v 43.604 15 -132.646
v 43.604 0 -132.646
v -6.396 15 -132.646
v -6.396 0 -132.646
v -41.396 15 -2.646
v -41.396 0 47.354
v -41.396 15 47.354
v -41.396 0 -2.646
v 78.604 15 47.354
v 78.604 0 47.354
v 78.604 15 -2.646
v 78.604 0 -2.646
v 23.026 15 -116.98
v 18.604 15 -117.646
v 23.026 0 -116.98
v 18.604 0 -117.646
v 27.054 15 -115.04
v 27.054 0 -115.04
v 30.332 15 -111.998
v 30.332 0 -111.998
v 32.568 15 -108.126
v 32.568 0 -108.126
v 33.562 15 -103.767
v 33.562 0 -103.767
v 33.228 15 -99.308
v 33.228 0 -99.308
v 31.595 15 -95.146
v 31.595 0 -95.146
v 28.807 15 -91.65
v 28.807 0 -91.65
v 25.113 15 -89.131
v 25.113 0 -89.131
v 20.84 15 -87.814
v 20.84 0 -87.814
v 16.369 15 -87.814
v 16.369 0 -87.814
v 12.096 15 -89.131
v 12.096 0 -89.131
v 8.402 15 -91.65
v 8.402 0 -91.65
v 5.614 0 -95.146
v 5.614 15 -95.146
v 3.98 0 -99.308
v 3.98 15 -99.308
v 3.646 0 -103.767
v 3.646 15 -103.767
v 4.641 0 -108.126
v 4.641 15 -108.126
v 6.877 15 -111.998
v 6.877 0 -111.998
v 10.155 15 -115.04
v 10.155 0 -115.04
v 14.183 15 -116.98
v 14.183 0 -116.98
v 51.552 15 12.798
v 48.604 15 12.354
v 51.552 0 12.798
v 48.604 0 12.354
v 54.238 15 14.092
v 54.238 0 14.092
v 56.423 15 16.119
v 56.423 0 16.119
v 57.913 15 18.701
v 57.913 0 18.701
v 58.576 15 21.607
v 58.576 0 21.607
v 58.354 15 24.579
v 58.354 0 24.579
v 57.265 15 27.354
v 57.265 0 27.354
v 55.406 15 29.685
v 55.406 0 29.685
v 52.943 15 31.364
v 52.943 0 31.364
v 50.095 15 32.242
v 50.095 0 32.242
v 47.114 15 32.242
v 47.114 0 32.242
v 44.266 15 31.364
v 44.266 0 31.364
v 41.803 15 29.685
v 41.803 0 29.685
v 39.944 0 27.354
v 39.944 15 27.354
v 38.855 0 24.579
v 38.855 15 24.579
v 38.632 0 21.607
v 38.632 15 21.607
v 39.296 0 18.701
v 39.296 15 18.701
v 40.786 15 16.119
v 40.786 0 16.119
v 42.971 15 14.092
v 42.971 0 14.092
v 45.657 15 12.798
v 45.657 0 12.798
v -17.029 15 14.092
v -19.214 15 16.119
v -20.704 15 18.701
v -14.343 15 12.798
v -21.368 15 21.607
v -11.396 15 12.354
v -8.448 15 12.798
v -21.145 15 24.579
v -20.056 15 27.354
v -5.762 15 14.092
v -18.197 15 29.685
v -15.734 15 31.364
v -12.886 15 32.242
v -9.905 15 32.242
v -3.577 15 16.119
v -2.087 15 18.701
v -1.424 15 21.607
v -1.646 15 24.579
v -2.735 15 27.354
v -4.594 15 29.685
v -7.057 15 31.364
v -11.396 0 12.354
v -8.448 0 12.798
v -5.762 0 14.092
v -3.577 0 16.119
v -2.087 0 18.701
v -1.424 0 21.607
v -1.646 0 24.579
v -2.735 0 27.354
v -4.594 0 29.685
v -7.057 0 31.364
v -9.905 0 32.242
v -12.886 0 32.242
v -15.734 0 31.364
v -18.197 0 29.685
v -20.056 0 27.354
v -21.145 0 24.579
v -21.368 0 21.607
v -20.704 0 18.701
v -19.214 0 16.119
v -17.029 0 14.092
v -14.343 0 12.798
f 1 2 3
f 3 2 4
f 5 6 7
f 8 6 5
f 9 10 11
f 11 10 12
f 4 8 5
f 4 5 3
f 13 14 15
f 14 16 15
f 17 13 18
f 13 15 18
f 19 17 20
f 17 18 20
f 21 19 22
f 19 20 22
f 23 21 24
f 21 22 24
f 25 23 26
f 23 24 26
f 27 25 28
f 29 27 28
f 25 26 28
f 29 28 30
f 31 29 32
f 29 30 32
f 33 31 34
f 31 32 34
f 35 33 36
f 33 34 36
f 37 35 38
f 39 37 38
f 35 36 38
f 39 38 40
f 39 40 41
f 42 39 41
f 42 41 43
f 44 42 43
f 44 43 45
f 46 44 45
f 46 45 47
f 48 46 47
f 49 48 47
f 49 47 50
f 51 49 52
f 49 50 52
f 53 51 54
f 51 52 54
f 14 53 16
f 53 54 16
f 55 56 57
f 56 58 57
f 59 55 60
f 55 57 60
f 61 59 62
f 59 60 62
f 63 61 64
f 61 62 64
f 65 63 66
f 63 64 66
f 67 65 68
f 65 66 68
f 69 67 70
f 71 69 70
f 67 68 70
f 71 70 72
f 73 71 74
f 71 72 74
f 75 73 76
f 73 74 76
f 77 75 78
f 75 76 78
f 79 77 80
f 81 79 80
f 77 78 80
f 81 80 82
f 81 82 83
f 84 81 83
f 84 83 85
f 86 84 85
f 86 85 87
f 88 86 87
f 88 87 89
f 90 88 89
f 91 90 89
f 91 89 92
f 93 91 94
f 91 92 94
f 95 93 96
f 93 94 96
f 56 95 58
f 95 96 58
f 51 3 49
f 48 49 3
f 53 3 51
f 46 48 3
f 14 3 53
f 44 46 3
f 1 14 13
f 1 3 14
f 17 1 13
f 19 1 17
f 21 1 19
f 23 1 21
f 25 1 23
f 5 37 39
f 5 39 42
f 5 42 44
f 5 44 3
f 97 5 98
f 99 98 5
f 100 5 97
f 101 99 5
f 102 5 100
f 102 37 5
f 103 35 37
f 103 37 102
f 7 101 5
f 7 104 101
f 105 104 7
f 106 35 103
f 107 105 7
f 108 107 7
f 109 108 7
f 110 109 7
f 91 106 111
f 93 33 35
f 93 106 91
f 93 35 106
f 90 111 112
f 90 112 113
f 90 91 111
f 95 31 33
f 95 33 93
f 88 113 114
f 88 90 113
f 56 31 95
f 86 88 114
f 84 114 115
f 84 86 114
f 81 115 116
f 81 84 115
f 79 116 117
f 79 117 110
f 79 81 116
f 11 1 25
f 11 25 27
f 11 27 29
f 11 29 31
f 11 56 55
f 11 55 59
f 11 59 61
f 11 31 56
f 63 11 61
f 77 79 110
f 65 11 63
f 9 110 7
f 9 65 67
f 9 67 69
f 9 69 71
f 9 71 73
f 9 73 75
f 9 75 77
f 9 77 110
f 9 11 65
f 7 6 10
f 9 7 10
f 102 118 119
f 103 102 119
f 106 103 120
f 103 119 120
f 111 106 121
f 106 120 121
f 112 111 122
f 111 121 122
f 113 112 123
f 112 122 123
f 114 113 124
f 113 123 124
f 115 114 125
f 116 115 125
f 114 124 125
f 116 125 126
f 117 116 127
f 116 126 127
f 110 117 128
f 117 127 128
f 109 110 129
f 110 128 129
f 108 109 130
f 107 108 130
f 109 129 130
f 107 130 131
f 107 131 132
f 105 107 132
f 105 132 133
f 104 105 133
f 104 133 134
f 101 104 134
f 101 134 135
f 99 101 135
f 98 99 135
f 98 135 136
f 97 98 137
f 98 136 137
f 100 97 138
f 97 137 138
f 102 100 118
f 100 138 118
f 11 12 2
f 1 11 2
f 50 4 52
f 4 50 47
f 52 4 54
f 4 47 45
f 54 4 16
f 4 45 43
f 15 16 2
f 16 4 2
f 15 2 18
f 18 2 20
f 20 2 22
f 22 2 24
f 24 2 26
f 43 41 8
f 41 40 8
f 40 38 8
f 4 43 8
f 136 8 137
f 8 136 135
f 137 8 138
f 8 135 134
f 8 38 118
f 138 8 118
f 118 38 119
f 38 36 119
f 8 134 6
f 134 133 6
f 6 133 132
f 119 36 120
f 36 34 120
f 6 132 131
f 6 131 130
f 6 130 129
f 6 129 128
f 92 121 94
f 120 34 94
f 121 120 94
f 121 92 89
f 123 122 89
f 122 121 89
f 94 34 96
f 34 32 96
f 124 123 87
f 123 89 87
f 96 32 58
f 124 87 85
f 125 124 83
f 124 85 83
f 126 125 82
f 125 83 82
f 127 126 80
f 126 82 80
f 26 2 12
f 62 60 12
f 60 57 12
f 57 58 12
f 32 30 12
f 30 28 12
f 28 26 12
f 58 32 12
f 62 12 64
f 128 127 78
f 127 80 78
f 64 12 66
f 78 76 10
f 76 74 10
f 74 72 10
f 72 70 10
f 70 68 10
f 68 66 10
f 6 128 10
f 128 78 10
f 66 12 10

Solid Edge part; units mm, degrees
sketch "Sketch1" plane through (0, 0, 0) normal (0, -1, 0) x (1, 0, 0)
  line L0 (-41.3956, 47.354) -> (78.6044, 47.354)
  line L1 (78.6044, 47.354) -> (78.6044, -2.646)
  line L2 (78.6044, -2.646) -> (43.6044, -132.646)
  line L3 (43.6044, -132.646) -> (-6.3956, -132.646)
  line L4 (-41.3956, -2.646) -> (-6.3956, -132.646)
  line L5 (-41.3956, 47.354) -> (-41.3956, -2.646)
extrude "Protrusion1" add sketch "Sketch1" against normal blind 15
hole "Hole1" at (18.6044, 0, -102.646) direction (0, 1, 0) diameter 30 end up to next
hole "Hole_2" at (48.6044, 0, 22.354) direction (0, 1, 0) diameter 20 end up to next
hole "Hole_3" at (-11.3956, 0, 22.354) direction (0, 1, 0) diameter 20 end up to next
properties part number "SP-2070" material "Steel"
